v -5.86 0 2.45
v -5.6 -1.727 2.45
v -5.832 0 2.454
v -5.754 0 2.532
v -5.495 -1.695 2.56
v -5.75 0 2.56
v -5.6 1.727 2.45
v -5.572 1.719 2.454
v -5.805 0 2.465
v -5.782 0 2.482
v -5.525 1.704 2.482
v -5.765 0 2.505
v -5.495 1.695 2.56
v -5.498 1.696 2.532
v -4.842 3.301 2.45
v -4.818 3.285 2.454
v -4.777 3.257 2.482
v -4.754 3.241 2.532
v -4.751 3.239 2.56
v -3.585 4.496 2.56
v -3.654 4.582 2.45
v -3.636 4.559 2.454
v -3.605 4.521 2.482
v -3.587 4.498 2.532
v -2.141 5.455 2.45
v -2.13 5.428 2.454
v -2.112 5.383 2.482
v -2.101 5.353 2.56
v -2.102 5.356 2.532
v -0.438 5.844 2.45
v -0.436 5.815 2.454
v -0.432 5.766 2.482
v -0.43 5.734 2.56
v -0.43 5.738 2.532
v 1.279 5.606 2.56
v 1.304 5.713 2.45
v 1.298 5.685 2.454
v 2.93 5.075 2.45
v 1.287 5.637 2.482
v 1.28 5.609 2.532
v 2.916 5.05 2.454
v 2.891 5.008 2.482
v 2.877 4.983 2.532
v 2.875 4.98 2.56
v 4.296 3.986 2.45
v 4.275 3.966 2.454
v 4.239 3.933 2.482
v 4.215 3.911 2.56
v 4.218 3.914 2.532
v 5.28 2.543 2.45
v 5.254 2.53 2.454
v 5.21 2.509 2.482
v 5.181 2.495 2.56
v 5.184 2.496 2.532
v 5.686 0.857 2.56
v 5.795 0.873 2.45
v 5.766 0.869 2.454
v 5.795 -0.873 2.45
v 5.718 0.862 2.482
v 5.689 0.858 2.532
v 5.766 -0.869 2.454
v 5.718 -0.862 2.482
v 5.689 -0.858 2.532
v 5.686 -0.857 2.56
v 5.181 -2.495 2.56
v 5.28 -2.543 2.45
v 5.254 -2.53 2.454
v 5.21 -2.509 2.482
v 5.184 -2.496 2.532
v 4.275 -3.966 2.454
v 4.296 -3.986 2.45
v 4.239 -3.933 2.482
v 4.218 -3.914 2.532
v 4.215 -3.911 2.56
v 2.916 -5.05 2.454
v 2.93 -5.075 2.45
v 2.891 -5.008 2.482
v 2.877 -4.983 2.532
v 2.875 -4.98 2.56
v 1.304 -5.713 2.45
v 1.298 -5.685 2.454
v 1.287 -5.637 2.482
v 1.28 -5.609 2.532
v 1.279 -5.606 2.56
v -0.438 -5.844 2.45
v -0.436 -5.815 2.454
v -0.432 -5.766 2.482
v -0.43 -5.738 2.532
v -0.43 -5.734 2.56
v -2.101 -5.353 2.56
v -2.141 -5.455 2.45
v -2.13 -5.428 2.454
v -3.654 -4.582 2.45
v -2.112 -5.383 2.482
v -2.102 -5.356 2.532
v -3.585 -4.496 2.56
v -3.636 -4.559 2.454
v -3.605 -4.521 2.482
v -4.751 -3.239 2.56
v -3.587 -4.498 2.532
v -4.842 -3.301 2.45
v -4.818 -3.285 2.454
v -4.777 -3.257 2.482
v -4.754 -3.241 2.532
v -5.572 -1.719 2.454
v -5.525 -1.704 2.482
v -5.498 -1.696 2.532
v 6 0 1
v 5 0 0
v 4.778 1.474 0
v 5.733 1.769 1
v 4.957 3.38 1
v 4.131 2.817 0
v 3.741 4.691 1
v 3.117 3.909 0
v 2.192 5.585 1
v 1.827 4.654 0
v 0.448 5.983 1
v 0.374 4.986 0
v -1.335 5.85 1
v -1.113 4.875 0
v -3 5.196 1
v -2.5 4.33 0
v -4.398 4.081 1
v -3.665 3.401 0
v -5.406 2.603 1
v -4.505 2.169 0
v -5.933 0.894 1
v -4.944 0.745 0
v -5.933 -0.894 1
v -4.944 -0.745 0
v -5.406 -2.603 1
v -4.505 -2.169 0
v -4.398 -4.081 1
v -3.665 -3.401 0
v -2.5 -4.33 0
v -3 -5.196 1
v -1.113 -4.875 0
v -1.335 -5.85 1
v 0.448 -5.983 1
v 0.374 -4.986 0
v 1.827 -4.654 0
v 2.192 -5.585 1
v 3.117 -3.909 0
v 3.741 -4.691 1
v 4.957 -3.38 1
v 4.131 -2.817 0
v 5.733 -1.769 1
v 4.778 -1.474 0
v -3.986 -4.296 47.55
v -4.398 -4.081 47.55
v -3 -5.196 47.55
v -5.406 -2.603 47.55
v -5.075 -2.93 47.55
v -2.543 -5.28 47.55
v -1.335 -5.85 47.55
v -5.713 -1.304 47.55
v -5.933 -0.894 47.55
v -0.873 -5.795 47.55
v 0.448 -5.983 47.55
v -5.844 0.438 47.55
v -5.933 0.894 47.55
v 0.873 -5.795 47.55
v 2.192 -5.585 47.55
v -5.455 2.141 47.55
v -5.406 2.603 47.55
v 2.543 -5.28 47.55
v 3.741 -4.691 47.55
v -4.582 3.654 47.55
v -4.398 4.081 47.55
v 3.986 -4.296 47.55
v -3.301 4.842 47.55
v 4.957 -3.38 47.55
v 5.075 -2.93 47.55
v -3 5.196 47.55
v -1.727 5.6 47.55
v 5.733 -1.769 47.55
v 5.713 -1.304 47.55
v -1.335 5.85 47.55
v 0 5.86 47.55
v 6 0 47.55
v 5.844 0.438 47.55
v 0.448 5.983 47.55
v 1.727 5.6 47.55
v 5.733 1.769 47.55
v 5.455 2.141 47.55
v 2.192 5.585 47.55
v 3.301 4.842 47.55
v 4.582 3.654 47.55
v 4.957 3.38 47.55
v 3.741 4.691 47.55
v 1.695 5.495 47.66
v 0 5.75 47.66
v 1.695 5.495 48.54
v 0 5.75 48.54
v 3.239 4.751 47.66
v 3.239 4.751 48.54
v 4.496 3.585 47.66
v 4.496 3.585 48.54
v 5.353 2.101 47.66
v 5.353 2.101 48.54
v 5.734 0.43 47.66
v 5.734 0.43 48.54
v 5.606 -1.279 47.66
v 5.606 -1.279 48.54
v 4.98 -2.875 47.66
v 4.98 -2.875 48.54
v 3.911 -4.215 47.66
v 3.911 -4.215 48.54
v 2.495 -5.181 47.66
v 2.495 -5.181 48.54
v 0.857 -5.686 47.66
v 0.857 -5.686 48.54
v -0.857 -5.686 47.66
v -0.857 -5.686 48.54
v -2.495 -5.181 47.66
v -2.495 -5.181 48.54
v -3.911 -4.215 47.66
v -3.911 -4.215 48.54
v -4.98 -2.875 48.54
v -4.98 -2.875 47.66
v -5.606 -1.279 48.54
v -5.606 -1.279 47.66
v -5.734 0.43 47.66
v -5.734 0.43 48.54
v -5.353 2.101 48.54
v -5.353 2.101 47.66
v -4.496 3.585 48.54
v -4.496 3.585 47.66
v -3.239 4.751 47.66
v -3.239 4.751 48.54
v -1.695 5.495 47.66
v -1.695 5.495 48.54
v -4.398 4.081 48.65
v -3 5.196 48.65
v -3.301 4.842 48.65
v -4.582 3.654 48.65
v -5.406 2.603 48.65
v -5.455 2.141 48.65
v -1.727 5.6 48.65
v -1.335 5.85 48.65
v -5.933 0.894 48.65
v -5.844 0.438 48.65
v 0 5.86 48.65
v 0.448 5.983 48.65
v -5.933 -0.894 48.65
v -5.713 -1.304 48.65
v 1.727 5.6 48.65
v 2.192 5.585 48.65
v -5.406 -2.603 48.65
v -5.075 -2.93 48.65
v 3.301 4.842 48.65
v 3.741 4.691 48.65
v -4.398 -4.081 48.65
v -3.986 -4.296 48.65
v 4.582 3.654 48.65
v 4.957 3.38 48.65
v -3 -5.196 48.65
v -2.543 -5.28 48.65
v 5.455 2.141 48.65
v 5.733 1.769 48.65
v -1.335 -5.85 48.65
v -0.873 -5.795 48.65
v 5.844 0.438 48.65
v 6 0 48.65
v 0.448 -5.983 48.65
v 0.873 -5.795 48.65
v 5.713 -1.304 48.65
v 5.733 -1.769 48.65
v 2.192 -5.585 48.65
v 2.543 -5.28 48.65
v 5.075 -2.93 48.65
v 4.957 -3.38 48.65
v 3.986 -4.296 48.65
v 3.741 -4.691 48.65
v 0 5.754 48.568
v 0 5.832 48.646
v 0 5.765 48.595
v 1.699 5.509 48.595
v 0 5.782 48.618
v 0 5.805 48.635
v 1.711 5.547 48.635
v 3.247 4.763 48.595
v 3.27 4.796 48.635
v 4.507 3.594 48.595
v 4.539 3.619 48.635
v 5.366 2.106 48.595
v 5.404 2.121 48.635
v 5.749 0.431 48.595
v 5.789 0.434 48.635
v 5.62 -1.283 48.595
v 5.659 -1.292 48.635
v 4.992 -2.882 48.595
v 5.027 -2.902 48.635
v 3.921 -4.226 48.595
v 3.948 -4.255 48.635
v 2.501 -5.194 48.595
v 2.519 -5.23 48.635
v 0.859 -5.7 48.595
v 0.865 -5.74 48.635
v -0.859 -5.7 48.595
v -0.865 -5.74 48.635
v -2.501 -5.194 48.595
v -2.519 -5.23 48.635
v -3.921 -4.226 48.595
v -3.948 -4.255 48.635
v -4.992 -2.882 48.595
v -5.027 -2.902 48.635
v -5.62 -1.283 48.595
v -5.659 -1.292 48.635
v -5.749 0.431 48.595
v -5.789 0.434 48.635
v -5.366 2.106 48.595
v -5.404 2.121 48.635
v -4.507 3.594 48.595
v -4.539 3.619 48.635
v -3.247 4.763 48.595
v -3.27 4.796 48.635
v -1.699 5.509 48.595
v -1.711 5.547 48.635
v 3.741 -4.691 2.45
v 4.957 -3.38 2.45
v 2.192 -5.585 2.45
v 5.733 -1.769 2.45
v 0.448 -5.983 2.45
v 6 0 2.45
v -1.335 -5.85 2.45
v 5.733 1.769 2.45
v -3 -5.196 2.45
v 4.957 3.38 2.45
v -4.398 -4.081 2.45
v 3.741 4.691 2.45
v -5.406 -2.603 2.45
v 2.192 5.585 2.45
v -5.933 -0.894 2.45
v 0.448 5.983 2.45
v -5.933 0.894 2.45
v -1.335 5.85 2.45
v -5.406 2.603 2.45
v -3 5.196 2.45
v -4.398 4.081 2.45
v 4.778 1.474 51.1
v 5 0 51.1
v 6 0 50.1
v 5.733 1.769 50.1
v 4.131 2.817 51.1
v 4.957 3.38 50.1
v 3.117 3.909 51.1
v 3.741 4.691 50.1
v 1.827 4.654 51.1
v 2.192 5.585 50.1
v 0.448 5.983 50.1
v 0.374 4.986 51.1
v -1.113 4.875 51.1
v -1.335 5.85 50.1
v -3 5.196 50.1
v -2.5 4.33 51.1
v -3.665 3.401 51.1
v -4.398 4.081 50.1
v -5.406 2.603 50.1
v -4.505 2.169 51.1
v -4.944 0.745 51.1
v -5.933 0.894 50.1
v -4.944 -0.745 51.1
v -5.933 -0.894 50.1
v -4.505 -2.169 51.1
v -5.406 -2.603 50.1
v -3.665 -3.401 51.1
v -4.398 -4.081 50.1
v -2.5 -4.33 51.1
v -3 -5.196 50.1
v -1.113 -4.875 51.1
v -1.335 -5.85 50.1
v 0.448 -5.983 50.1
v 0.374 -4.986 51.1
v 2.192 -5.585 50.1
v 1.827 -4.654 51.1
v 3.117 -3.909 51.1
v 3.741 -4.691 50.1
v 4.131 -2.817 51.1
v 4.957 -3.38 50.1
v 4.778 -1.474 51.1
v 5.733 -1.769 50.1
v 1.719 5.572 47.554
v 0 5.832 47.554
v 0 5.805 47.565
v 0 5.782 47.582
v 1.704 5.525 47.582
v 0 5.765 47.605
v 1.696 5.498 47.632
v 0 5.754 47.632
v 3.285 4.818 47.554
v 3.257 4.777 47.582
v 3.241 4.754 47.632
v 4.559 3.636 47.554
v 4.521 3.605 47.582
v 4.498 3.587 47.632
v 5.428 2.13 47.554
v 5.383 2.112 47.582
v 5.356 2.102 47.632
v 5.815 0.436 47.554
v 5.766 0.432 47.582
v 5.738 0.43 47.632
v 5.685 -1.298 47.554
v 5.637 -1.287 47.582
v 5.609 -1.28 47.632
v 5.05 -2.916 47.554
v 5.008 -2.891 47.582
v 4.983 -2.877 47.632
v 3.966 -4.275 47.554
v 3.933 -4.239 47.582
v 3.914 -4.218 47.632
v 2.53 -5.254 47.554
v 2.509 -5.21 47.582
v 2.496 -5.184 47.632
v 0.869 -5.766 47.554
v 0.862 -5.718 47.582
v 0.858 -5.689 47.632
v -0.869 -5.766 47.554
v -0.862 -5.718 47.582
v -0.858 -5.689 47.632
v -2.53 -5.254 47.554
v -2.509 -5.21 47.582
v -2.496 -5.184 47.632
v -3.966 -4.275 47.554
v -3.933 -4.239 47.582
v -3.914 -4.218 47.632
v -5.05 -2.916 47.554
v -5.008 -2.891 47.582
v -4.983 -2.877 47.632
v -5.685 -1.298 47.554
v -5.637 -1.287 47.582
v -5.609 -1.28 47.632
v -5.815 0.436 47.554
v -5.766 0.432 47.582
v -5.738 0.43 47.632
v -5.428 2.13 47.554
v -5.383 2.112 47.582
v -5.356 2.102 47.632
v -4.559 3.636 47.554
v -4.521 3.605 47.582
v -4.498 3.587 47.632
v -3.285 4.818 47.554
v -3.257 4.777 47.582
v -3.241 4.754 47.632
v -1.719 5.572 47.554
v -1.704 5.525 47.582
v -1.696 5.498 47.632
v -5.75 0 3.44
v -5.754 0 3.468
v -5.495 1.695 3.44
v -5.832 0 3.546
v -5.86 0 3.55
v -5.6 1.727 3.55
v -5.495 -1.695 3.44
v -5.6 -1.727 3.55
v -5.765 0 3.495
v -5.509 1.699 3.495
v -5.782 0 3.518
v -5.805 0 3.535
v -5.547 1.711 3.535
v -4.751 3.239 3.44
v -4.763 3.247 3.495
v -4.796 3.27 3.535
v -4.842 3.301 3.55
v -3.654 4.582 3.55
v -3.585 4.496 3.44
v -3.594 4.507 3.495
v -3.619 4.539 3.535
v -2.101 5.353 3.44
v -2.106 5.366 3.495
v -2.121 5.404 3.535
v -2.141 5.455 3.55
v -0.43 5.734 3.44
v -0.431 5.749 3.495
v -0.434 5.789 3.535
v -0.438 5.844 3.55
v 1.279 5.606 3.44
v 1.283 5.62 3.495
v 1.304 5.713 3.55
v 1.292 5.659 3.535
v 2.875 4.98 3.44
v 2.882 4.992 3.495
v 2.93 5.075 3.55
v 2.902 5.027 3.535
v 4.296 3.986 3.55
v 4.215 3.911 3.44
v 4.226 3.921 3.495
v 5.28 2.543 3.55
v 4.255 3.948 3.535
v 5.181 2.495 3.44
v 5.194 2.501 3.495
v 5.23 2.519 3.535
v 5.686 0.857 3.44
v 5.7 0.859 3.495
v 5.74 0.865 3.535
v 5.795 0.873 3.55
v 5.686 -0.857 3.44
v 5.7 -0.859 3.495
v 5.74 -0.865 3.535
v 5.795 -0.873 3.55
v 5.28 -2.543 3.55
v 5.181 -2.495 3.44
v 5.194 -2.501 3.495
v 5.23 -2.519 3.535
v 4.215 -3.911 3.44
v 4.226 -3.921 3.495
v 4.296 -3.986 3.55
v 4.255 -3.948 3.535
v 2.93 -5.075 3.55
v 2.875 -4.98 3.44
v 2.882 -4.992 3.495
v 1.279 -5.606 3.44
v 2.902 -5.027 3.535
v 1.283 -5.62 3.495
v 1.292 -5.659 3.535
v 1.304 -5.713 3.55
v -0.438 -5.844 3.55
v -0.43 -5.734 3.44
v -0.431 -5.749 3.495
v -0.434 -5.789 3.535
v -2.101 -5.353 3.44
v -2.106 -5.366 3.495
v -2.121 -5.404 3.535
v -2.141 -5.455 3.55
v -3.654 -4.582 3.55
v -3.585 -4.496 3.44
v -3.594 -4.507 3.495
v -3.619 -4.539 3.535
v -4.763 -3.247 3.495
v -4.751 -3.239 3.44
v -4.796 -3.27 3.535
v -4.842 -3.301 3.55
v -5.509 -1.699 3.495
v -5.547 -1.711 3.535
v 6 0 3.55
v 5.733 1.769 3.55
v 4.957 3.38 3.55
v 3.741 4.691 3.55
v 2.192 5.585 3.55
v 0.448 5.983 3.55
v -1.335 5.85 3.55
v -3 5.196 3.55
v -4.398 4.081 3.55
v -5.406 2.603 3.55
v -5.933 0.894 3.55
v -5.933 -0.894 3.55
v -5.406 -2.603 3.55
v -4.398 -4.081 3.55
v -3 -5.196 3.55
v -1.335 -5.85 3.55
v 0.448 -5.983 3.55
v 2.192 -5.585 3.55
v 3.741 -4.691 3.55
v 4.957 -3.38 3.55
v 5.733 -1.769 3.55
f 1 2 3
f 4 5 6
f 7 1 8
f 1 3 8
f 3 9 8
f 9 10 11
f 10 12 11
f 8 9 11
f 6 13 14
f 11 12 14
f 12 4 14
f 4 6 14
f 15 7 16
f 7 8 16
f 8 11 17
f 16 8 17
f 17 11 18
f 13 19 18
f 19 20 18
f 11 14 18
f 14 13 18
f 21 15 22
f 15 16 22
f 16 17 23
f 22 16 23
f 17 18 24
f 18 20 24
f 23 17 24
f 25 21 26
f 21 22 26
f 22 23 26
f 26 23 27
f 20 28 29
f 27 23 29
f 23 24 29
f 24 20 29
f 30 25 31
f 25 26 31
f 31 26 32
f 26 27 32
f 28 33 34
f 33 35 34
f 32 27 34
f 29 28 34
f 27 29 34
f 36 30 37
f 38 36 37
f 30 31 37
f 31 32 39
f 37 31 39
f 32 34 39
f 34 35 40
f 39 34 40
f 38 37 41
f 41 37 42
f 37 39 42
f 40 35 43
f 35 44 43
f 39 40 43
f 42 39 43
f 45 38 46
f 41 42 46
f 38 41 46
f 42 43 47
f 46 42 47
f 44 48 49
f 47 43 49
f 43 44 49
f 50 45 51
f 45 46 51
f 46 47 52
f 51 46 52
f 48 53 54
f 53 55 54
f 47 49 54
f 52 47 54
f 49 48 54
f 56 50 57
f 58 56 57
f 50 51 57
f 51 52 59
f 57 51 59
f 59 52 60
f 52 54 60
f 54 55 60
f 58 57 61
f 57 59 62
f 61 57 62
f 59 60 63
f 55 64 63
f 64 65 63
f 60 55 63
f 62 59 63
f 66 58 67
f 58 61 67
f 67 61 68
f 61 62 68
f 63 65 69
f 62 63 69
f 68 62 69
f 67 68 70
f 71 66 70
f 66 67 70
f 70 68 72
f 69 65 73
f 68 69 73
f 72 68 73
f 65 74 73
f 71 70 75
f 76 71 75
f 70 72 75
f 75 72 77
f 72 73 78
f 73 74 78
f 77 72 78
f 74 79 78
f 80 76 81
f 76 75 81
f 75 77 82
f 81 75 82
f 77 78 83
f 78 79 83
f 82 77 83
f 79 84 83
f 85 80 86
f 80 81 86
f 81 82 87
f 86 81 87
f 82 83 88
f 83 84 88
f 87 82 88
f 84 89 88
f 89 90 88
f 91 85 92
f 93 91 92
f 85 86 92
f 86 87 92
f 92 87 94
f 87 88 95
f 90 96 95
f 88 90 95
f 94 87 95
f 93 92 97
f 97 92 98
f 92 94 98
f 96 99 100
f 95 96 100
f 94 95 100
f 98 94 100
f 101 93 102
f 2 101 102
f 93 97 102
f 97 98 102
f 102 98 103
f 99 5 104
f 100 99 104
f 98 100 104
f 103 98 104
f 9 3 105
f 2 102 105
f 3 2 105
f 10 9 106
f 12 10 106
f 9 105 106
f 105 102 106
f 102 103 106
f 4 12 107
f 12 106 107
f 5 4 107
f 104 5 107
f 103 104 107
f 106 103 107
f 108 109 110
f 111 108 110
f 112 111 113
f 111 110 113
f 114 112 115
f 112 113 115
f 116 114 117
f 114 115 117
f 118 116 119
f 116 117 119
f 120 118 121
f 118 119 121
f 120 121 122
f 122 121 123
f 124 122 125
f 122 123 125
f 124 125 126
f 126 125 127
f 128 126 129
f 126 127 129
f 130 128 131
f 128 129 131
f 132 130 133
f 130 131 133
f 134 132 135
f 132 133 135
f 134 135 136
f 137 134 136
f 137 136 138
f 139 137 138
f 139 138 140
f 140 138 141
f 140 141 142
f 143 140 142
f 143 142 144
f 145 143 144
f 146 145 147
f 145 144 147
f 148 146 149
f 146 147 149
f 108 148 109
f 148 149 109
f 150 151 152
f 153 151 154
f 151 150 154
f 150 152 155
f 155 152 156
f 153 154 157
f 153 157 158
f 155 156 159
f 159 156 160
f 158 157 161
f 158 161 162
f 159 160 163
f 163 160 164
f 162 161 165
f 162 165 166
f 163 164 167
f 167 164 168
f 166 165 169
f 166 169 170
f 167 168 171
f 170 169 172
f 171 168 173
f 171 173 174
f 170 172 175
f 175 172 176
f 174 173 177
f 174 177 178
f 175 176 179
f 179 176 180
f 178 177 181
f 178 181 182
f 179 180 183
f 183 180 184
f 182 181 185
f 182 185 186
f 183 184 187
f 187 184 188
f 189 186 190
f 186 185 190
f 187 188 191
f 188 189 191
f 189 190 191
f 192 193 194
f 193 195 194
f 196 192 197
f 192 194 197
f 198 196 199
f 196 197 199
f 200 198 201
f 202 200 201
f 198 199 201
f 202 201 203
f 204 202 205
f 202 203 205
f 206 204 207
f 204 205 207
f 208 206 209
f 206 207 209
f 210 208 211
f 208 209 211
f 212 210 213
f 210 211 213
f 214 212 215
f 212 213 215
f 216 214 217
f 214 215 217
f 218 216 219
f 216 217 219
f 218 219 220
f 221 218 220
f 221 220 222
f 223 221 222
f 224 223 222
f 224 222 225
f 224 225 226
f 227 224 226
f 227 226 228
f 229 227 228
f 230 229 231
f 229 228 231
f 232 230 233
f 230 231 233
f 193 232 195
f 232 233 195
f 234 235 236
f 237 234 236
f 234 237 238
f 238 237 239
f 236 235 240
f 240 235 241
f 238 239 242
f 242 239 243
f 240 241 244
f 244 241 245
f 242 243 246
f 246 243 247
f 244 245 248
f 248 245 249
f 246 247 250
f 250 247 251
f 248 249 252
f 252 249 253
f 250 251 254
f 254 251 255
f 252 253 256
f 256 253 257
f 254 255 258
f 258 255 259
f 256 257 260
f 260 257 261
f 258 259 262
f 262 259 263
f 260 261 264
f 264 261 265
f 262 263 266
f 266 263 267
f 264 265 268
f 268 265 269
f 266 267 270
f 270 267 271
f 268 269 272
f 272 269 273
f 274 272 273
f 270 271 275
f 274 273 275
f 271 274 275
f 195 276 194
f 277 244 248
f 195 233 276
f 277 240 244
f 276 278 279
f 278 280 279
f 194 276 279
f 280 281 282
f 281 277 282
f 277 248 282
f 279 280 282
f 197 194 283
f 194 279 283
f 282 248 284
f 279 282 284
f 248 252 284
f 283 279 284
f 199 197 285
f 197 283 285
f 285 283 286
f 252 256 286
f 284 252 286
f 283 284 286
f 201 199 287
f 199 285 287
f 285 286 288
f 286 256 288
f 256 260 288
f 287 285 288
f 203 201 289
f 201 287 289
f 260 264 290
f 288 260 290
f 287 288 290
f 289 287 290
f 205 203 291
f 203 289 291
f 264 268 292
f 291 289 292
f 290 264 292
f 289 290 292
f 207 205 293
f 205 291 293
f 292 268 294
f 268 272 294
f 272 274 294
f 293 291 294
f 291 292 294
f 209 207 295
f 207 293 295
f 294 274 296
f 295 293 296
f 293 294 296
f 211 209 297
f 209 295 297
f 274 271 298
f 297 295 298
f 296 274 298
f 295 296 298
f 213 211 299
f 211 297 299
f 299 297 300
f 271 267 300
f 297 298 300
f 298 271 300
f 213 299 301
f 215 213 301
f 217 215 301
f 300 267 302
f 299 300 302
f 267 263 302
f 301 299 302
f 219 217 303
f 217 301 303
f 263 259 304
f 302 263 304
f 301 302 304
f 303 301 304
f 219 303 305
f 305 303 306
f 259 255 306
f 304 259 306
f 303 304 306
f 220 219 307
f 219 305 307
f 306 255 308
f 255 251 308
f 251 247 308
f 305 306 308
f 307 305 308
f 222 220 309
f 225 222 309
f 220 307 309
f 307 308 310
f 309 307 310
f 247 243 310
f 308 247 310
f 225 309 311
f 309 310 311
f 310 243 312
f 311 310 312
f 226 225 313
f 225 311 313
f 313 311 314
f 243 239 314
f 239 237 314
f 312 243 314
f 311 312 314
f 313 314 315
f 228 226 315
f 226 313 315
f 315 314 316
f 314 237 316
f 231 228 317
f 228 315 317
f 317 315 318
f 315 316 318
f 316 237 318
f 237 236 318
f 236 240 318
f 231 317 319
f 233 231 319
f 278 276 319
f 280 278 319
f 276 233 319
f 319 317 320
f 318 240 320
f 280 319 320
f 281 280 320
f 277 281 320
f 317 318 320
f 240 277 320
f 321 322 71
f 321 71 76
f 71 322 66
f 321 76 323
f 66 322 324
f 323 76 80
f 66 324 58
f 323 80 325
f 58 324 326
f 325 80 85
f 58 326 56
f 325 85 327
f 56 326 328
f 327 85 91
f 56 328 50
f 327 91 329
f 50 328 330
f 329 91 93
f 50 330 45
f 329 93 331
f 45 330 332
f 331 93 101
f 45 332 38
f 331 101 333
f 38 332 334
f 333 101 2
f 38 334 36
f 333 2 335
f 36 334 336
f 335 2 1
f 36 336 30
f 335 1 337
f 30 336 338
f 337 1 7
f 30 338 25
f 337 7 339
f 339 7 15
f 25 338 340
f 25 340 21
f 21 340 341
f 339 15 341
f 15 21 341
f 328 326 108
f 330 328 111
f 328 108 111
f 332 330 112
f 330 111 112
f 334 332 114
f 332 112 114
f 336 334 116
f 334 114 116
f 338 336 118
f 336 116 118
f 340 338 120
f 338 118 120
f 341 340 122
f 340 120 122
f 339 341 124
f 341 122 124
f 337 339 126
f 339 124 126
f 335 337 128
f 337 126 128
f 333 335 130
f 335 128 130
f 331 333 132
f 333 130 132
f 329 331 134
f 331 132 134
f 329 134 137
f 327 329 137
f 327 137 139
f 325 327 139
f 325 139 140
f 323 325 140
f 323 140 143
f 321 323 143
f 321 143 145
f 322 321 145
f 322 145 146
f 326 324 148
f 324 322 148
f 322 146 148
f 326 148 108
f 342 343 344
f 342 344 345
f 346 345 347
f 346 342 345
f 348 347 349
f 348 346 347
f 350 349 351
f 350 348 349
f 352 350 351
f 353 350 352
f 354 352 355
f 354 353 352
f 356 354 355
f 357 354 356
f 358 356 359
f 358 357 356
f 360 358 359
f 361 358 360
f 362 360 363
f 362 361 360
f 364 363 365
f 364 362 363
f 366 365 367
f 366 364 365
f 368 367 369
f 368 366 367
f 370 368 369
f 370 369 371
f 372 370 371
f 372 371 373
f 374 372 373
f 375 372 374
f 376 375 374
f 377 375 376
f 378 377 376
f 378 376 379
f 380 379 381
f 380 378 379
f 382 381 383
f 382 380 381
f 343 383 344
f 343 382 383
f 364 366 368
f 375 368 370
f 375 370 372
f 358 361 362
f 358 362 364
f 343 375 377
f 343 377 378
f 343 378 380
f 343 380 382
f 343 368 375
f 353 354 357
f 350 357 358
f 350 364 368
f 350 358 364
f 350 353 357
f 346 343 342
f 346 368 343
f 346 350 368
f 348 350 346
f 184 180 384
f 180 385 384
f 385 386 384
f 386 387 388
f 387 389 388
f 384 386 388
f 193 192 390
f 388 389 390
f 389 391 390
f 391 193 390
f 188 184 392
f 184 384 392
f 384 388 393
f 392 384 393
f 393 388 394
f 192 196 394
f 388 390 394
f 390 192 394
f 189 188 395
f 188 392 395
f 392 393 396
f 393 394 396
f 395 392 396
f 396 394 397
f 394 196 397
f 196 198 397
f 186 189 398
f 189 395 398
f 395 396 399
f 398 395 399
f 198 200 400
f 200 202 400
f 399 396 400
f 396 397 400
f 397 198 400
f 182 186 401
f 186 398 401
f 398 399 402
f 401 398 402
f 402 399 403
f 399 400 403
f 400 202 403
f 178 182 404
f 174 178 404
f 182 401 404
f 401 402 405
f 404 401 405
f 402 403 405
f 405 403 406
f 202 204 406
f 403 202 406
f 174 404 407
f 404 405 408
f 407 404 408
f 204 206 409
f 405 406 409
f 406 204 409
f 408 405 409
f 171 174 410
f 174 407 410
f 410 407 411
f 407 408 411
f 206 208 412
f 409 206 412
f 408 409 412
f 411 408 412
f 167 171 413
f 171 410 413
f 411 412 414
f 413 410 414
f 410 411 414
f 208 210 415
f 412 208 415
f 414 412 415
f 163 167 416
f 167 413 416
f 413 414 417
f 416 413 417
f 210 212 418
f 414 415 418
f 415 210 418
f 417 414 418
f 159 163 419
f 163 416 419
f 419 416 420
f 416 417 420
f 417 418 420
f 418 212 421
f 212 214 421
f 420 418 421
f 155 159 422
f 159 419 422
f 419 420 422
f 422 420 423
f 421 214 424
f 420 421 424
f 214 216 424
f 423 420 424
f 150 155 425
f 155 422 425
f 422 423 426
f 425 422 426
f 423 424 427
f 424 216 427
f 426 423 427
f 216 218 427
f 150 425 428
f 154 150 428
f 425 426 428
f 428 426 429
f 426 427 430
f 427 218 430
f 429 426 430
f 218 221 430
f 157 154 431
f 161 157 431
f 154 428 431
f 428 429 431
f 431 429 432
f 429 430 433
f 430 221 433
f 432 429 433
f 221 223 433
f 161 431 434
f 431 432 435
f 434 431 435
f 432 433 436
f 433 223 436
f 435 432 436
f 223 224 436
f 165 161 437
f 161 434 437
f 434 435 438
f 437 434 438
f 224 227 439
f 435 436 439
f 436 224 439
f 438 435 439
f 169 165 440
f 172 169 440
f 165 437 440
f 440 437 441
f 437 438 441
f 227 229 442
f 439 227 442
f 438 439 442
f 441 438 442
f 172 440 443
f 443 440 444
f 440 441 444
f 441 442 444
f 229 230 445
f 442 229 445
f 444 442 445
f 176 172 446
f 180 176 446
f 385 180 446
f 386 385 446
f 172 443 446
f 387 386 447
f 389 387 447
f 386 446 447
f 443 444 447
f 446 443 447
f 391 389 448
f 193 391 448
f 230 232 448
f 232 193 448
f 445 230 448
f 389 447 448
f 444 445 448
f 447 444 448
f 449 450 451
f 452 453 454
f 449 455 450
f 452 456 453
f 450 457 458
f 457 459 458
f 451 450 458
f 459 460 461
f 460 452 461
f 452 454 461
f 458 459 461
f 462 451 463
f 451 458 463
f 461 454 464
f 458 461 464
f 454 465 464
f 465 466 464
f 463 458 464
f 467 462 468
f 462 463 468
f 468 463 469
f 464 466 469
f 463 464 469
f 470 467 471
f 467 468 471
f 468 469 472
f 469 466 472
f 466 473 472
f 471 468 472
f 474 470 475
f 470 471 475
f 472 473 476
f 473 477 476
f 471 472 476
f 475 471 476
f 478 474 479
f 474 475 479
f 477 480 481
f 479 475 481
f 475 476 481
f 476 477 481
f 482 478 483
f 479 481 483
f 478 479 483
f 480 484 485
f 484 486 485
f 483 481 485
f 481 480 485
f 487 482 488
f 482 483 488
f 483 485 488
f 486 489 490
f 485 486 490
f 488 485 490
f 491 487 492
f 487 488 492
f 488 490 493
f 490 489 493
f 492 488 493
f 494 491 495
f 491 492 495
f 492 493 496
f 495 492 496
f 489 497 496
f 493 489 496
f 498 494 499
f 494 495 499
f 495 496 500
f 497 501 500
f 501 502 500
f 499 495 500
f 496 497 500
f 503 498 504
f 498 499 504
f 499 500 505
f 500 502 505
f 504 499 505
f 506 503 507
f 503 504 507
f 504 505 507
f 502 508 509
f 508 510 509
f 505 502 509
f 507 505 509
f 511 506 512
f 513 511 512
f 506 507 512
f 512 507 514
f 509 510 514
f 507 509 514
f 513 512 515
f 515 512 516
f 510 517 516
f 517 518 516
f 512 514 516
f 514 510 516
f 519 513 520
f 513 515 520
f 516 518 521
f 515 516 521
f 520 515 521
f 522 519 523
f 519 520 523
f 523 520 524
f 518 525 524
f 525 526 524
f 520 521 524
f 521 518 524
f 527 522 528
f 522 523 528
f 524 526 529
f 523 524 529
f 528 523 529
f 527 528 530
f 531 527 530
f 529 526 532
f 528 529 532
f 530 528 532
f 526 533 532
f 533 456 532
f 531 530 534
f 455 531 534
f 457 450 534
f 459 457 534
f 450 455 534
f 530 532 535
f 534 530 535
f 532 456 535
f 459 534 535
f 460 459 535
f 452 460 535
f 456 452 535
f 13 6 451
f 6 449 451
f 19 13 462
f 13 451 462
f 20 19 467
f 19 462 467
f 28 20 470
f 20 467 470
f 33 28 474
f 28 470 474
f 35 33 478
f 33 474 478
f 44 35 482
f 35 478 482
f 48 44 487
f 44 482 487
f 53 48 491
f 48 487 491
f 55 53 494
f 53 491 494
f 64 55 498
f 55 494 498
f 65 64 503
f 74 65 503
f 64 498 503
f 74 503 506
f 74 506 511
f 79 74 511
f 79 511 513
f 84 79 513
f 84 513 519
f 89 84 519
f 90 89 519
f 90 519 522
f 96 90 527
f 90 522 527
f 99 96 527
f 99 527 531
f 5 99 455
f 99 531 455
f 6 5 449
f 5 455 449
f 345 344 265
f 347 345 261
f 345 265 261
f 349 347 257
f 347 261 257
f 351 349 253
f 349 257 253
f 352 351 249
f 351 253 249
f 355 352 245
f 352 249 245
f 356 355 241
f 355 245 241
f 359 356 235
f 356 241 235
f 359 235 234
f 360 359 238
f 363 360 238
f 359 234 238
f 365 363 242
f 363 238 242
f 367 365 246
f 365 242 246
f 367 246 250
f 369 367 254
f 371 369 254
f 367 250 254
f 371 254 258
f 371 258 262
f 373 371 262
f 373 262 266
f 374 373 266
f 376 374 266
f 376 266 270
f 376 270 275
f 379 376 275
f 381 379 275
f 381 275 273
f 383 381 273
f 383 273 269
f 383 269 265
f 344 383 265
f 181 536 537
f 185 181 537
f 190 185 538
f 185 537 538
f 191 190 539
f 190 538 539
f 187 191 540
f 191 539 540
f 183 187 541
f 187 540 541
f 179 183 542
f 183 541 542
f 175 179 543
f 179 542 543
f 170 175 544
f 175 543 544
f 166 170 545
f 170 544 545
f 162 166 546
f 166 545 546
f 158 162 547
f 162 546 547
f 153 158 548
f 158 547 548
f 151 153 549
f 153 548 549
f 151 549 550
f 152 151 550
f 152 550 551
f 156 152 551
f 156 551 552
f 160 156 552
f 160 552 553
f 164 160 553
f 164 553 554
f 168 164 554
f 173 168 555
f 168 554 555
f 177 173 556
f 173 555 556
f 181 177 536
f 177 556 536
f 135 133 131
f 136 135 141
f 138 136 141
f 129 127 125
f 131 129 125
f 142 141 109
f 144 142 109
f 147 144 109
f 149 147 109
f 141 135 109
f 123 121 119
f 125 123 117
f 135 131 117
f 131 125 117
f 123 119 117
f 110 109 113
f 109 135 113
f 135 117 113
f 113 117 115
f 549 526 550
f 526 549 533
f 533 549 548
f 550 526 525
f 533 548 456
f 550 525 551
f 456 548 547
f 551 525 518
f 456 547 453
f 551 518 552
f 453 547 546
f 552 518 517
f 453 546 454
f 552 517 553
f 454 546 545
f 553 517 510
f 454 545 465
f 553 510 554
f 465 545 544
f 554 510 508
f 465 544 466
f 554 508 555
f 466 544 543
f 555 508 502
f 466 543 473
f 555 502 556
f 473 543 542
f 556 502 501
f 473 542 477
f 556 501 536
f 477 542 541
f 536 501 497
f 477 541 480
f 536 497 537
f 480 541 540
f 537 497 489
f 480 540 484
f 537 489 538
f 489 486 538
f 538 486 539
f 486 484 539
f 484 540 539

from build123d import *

# Parameters (mm, degrees)
SKETCH1_R           = 6
BOSS_EXTRUDE1_DEPTH = 51.1
CHAMFER1_SIZE       = 1


with BuildPart() as part:
    # Sketch1 → Boss-Extrude1 (new body)
    with BuildSketch(Plane.XY):
        Circle(SKETCH1_R)
    extrude(amount=BOSS_EXTRUDE1_DEPTH)

    # Chamfer1
    chamfer1_edges = [part.edges().sort_by_distance(p)[0] for p in [
        (-6, 0, 0),
        (-6, 0, 51.1),
    ]]
    chamfer(chamfer1_edges, length=CHAMFER1_SIZE)

    # Groove Sketch → Retaining Ring Groove (revolve, cut)
    with BuildSketch(Plane(origin=(11.571093486, 1.818413045, 30.848914431), x_dir=(-0.1670407778174849, -0.02625068493329621, 0.9856004667646331), z_dir=(0.1552460285814813, -0.987875837648476, 0)), mode=Mode.PRIVATE) as retaining_ring_groove_sk:
        with BuildLine():
            Line((20.516209746, 14.310059643), (20.539882467, 14.448043709))
            Line((20.539882467, 14.448043709), (19.455721954, 14.634043658))
            Line((19.455721954, 14.634043658), (19.432049233, 14.496059593))
            ThreePointArc((19.432049233, 14.496059593), (19.450651377, 14.413950055), (19.521865289, 14.369043546))
            Line((19.521865289, 14.369043546), (20.3891937, 14.220243587))
            ThreePointArc((20.3891937, 14.220243587), (20.471303237, 14.238845731), (20.516209746, 14.310059643))
        make_face()
    revolve(retaining_ring_groove_sk.sketch.rotate(Axis((0, 0, 39.317134261), (0, 0, -1)), 98.931065378), axis=Axis((0, 0, 39.317134261), (0, 0, -1)), mode=Mode.SUBTRACT)

    # Groove Sketch1 → Retaining Ring Groove1 (revolve, cut)
    with BuildSketch(Plane(origin=(11.571093486, 1.818413045, 30.848914431), x_dir=(-0.16704077781748494, -0.02625068493329602, 0.9856004667646331), z_dir=(0.1552460285814813, -0.987875837648476, 0)), mode=Mode.PRIVATE) as retaining_ring_groove1_sk:
        with BuildLine():
            Line((-23.934371305, 21.93605756), (-23.910698584, 22.074041625))
            Line((-23.910698584, 22.074041625), (-24.994859097, 22.260041574))
            Line((-24.994859097, 22.260041574), (-25.018531818, 22.122057509))
            ThreePointArc((-25.018531818, 22.122057509), (-24.999929675, 22.039947971), (-24.928715762, 21.995041463))
            Line((-24.928715762, 21.995041463), (-24.061387351, 21.846241503))
            ThreePointArc((-24.061387351, 21.846241503), (-23.979277814, 21.864843647), (-23.934371305, 21.93605756))
        make_face()
    revolve(retaining_ring_groove1_sk.sketch.rotate(Axis((0, 0, 39.317134261), (0, 0, -1)), 8.931065378), axis=Axis((0, 0, 39.317134261), (0, 0, -1)), mode=Mode.SUBTRACT)


solid = part.part
